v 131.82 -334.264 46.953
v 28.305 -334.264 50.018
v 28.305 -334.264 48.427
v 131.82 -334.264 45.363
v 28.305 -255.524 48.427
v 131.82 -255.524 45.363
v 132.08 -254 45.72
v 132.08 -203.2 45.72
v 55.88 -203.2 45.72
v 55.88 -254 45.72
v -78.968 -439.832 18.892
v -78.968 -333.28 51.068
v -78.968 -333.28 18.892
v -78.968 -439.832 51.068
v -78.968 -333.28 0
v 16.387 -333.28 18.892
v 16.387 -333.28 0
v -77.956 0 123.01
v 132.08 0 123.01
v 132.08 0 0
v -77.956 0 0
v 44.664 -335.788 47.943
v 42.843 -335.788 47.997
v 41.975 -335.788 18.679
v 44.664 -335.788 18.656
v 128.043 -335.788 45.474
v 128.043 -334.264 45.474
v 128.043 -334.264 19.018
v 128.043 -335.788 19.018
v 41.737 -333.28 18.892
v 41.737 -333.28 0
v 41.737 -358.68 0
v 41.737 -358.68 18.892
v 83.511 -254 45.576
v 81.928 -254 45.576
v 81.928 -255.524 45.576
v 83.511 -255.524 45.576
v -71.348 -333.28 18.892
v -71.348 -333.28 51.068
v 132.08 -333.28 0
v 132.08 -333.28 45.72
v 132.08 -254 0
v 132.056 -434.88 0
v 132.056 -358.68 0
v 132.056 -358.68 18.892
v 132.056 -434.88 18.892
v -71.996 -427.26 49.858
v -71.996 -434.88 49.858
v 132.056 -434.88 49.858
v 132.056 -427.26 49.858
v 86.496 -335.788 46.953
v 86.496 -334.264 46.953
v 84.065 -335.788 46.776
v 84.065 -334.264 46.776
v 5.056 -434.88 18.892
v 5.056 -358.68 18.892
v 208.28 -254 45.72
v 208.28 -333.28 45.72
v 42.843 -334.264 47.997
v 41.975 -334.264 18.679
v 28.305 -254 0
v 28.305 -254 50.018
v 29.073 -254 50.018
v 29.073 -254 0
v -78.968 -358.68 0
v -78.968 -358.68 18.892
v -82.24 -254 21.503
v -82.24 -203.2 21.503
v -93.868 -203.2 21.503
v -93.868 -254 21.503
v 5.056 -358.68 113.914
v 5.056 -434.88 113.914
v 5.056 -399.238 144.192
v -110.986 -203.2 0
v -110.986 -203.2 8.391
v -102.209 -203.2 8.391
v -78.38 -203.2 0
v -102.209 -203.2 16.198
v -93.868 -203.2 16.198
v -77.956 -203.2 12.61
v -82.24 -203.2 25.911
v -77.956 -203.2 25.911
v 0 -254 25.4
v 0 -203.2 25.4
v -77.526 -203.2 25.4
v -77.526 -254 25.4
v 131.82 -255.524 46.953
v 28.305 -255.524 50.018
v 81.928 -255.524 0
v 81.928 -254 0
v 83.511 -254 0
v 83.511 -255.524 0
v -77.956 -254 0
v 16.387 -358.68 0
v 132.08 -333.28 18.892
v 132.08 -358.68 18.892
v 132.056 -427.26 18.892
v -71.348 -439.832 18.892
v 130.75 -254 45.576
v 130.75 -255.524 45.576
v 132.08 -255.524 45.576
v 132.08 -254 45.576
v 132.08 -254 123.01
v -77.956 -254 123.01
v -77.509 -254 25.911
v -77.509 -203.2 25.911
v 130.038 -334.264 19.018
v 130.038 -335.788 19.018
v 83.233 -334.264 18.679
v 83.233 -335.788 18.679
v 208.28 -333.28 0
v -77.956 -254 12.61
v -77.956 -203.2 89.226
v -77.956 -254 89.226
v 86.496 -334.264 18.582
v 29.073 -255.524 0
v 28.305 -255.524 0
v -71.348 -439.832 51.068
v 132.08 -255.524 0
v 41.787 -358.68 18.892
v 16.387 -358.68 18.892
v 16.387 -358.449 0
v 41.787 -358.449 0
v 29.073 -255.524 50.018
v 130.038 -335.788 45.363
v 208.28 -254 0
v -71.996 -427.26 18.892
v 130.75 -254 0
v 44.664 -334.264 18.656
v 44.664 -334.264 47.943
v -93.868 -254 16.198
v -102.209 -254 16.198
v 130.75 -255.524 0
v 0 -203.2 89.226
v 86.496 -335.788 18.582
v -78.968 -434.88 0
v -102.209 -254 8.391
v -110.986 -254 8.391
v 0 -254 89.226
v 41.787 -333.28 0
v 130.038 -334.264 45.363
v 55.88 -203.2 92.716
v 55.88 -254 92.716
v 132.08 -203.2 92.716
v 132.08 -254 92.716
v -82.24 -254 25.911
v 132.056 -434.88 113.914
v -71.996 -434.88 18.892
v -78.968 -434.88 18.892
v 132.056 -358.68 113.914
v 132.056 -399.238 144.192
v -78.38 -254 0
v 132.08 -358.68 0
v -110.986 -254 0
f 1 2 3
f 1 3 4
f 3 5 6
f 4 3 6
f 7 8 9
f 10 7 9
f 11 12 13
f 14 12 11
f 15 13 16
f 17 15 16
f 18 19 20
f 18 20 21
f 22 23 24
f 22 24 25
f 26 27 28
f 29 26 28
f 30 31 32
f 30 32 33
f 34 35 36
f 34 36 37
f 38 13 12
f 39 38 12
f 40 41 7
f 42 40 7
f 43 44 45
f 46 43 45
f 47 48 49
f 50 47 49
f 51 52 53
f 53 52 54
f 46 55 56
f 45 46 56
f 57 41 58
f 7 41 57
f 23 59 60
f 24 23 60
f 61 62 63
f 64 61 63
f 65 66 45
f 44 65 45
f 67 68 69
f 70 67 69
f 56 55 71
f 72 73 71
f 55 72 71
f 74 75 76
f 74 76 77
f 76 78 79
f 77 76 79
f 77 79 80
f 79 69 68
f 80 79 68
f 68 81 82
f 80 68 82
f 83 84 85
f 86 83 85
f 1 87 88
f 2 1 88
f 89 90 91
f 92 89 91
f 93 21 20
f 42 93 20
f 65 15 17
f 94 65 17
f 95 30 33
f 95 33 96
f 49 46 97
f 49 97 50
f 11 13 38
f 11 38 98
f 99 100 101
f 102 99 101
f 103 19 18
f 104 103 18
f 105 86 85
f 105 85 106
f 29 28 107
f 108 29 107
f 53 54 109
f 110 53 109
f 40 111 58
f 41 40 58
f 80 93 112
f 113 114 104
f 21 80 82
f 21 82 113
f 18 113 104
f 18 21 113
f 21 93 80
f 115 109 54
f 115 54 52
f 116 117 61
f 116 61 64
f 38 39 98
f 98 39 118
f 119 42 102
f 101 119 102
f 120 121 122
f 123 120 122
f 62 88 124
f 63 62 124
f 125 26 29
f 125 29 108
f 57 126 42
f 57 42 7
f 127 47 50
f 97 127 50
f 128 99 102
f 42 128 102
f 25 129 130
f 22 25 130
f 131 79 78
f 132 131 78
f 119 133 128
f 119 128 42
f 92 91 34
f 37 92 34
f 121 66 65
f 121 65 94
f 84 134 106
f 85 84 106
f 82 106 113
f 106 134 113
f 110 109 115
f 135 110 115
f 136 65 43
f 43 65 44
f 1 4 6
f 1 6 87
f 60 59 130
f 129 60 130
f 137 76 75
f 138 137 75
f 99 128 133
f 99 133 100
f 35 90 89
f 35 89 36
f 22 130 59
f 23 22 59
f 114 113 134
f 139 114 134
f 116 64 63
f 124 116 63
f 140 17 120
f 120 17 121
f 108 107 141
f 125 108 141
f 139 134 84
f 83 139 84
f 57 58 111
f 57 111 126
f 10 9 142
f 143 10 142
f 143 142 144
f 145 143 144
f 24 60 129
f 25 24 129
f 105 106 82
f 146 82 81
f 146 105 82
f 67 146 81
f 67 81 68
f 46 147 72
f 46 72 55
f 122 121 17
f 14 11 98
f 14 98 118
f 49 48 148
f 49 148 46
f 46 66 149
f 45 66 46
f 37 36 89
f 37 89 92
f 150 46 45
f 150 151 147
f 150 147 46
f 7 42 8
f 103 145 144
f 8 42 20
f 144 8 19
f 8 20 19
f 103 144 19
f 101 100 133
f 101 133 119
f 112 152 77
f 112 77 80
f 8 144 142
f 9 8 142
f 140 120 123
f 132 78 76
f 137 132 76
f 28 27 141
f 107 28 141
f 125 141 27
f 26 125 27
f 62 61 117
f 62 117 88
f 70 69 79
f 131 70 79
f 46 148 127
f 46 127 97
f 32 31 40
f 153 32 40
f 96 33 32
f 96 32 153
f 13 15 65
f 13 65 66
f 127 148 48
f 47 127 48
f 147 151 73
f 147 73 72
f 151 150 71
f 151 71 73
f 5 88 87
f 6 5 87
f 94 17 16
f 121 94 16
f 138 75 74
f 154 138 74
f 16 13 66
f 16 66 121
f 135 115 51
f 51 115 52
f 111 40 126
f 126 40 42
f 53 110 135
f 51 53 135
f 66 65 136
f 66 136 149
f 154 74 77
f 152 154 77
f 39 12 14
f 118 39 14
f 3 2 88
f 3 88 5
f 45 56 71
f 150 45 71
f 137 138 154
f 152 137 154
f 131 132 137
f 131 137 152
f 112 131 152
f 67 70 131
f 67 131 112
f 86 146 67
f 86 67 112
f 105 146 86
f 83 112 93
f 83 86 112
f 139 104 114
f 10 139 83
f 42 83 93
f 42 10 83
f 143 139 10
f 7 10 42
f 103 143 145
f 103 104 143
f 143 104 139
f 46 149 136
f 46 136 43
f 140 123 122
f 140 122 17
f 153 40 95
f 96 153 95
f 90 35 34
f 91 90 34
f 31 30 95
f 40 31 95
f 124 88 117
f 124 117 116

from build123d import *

# Parameters (mm, degrees)
F1_DEPTH  = 254
F3_W      = 77.9563974186
F3_H      = 63.8258055005
F3_W_2    = 76.2
F3_H_2    = 46.9961089506
F4_DEPTH  = 203.2
F5_W      = 79.2795202732
F5_H      = 45.72
F6_DEPTH  = 76.2
F7_W      = 90.3434940743
F7_H      = 18.8920535147
F8_DEPTH  = 25.4
F7_W_2    = 95.3555908054
F9_W      = 211.0243588686
F9_H      = 18.8920535147
F10_DEPTH = 76.2
F12_DEPTH = 25.4
F14_DEPTH = 50.8
F15_W     = 0.7677413523
F15_H     = 50.0176846981
F16_DEPTH = 1.524
F15_W_2   = 1.5830248594
F15_H_2   = 45.5759838223
F15_W_3   = 1.3298803139
F18_DEPTH = 78.74
F20_DEPTH = 1.524
F21_W     = 106.5529286861
F21_H     = 32.1754552424
F22_DEPTH = 7.62
F23_W     = 204.0519267321
F23_H     = 30.9659726918
F24_DEPTH = 7.62
F26_DEPTH = 127


with BuildPart() as f1:
    # F0 (on Front) → F1 (new body)
    with BuildSketch(Plane.XZ):
        Polygon((-77.9563974186, 0), (0, 0), (132.08, 0), (132.08, 45.72), (55.88, 45.72), (55.88, 92.7161089506), (132.08, 92.7161089506), (132.08, 123.0103062721), (-24.9627400838, 123.0103062721), (-68.5986950994, 123.0103062721), (-77.9563974186, 123.0103062721), (-77.9563974186, 89.2258055005), (0, 89.2258055005), (0, 25.4), (-14.4551063059, 25.4), (-77.9563974186, 25.4), align=None)
    extrude(amount=F1_DEPTH)

    # F3 (on face) → F4 (join)
    with BuildSketch(Plane(origin=(0, 0, 0), x_dir=(-1, 0, 0), z_dir=(0, 1, 0))):
        with Locations((38.9781987093, 57.3129027503)):
            Rectangle(F3_W, F3_H)
        with Locations((-93.98, 69.2180544753)):
            Rectangle(F3_W_2, F3_H_2)
    extrude(amount=-F4_DEPTH)

    # F13 (on face) → F14 (join)
    with BuildSketch(Plane.XZ.offset(254)):
        Polygon((-110.9863519669, 0), (-78.3803388476, 0), (-77.5092169642, 25.9113758802), (-82.2400674224, 25.9113758802), (-82.2400674224, 21.5027388185), (-93.868099153, 21.5027388185), (-93.868099153, 16.1978695542), (-102.2087261081, 16.1978695542), (-102.2087261081, 8.3908801898), (-110.9863519669, 8.3908801898), align=None)
    extrude(amount=-F14_DEPTH)


with BuildPart() as f6:
    # F5 (on face) → F6 (new body)
    with BuildSketch(Plane.YZ.offset(132.08)):
        with Locations((-293.6397601366, 22.86)):
            Rectangle(F5_W, F5_H)
    extrude(amount=F6_DEPTH)


with BuildPart() as f8:
    # F7 (on face) → F8 (new body)
    with BuildSketch(Plane.XZ.offset(333.2795202732)):
        with Locations((86.9082529628, 9.4460267574)):
            Rectangle(F7_W, F7_H)
    extrude(amount=F8_DEPTH)


with BuildPart() as f8b:
    # F7 (on face) → F8, piece 2 (new body)
    with BuildSketch(Plane.XZ.offset(333.2795202732)):
        with Locations((-31.2905507162, 9.4460267574)):
            Rectangle(F7_W_2, F7_H)
    extrude(amount=F8_DEPTH)


with BuildPart() as f10:
    # F9 (on face) → F10 (new body)
    with BuildSketch(Plane.XZ.offset(358.6795202732)):
        with Locations((26.5438333154, 9.4460267574)):
            Rectangle(F9_W, F9_H)
    extrude(amount=F10_DEPTH)


with BuildPart() as f12:
    # F11 (on face) → F12 (new body)
    with BuildSketch(Plane.YZ.offset(16.3872446865)):
        Polygon((-358.4486246109, 0), (-333.2795202732, 0), (-358.6795202732, 18.8920535147), align=None)
    extrude(amount=F12_DEPTH)


with BuildPart() as f16:
    # F15 (on face) → F16 (new body)
    with BuildSketch(Plane.XZ.offset(254)):
        with Locations((28.6889392883, 25.0088423491)):
            Rectangle(F15_W, F15_H)
    extrude(amount=F16_DEPTH)


with BuildPart() as f16b:
    # F15 (on face) → F16, piece 2 (new body)
    with BuildSketch(Plane.XZ.offset(254)):
        with Locations((82.7194303274, 22.7879919112)):
            Rectangle(F15_W_2, F15_H_2)
    extrude(amount=F16_DEPTH)


with BuildPart() as f16c:
    # F15 (on face) → F16, piece 3 (new body)
    with BuildSketch(Plane.XZ.offset(254)):
        with Locations((131.4150598431, 22.7879919112)):
            Rectangle(F15_W_3, F15_H_2)
    extrude(amount=F16_DEPTH)


with BuildPart() as f18:
    # F17 (on face) → F18 (new body)
    with BuildSketch(Plane.XZ.offset(255.524)):
        Polygon((131.8197846413, 46.9529815018), (28.3050686121, 50.0176846981), (28.3050686121, 48.4273023903), (131.8197846413, 45.362599194), align=None)
    extrude(amount=F18_DEPTH)


with BuildPart() as f20:
    # F19 (on face) → F20 (new body)
    with BuildSketch(Plane.XZ.offset(334.264)):
        Polygon((42.8430716674, 47.9968837393), (41.9750735164, 18.6790097505), (44.6639020724, 18.6561252922), (44.6639020724, 47.9429754162), align=None)
    extrude(amount=F20_DEPTH)


with BuildPart() as f20b:
    # F19 (on face) → F20, piece 2 (new body)
    with BuildSketch(Plane.XZ.offset(334.264)):
        Polygon((86.4957340196, 46.9529815018), (84.0647137093, 46.7764572824), (83.2328480523, 18.6790097505), (86.4957340196, 18.5824072824), align=None)
    extrude(amount=F20_DEPTH)


with BuildPart() as f20c:
    # F19 (on face) → F20, piece 3 (new body)
    with BuildSketch(Plane.XZ.offset(334.264)):
        Polygon((130.038022995, 45.362599194), (128.0428667087, 45.4744203235), (128.0428667087, 19.0179720521), (130.038022995, 19.0179720521), align=None)
    extrude(amount=F20_DEPTH)


with BuildPart() as f22:
    # F21 (on face) → F22 (new body)
    with BuildSketch(Plane(origin=(-78.9683461189, 0, 0), x_dir=(0, -1, 0), z_dir=(-1, 0, 0))):
        with Locations((386.5559846163, 34.9797811359)):
            Rectangle(F21_W, F21_H)
    extrude(amount=-F22_DEPTH)


with BuildPart() as f24:
    # F23 (on face) → F24 (new body)
    with BuildSketch(Plane.XZ.offset(434.8795202732)):
        with Locations((30.0300493836, 34.3750398606)):
            Rectangle(F23_W, F23_H)
    extrude(amount=-F24_DEPTH)


with BuildPart() as f26:
    # F25 (on face) → F26 (new body)
    with BuildSketch(Plane.YZ.offset(132.0560127497)):
        Polygon((-434.8795202732, 18.8920535147), (-358.6795202732, 18.8920535147), (-358.6795202732, 49.4040995836), (-358.6795202732, 113.9142438769), (-434.8795202732, 113.9142438769), align=None)
        Polygon((-434.8795202732, 113.9142438769), (-358.6795202732, 113.9142438769), (-399.2381393909, 144.1921293736), align=None)
    extrude(amount=-F26_DEPTH)


solid = Compound([f1.part, f6.part, f8.part, f8b.part, f10.part, f12.part, f16.part, f16b.part, f16c.part, f18.part, f20.part, f20b.part, f20c.part, f22.part, f24.part, f26.part])
